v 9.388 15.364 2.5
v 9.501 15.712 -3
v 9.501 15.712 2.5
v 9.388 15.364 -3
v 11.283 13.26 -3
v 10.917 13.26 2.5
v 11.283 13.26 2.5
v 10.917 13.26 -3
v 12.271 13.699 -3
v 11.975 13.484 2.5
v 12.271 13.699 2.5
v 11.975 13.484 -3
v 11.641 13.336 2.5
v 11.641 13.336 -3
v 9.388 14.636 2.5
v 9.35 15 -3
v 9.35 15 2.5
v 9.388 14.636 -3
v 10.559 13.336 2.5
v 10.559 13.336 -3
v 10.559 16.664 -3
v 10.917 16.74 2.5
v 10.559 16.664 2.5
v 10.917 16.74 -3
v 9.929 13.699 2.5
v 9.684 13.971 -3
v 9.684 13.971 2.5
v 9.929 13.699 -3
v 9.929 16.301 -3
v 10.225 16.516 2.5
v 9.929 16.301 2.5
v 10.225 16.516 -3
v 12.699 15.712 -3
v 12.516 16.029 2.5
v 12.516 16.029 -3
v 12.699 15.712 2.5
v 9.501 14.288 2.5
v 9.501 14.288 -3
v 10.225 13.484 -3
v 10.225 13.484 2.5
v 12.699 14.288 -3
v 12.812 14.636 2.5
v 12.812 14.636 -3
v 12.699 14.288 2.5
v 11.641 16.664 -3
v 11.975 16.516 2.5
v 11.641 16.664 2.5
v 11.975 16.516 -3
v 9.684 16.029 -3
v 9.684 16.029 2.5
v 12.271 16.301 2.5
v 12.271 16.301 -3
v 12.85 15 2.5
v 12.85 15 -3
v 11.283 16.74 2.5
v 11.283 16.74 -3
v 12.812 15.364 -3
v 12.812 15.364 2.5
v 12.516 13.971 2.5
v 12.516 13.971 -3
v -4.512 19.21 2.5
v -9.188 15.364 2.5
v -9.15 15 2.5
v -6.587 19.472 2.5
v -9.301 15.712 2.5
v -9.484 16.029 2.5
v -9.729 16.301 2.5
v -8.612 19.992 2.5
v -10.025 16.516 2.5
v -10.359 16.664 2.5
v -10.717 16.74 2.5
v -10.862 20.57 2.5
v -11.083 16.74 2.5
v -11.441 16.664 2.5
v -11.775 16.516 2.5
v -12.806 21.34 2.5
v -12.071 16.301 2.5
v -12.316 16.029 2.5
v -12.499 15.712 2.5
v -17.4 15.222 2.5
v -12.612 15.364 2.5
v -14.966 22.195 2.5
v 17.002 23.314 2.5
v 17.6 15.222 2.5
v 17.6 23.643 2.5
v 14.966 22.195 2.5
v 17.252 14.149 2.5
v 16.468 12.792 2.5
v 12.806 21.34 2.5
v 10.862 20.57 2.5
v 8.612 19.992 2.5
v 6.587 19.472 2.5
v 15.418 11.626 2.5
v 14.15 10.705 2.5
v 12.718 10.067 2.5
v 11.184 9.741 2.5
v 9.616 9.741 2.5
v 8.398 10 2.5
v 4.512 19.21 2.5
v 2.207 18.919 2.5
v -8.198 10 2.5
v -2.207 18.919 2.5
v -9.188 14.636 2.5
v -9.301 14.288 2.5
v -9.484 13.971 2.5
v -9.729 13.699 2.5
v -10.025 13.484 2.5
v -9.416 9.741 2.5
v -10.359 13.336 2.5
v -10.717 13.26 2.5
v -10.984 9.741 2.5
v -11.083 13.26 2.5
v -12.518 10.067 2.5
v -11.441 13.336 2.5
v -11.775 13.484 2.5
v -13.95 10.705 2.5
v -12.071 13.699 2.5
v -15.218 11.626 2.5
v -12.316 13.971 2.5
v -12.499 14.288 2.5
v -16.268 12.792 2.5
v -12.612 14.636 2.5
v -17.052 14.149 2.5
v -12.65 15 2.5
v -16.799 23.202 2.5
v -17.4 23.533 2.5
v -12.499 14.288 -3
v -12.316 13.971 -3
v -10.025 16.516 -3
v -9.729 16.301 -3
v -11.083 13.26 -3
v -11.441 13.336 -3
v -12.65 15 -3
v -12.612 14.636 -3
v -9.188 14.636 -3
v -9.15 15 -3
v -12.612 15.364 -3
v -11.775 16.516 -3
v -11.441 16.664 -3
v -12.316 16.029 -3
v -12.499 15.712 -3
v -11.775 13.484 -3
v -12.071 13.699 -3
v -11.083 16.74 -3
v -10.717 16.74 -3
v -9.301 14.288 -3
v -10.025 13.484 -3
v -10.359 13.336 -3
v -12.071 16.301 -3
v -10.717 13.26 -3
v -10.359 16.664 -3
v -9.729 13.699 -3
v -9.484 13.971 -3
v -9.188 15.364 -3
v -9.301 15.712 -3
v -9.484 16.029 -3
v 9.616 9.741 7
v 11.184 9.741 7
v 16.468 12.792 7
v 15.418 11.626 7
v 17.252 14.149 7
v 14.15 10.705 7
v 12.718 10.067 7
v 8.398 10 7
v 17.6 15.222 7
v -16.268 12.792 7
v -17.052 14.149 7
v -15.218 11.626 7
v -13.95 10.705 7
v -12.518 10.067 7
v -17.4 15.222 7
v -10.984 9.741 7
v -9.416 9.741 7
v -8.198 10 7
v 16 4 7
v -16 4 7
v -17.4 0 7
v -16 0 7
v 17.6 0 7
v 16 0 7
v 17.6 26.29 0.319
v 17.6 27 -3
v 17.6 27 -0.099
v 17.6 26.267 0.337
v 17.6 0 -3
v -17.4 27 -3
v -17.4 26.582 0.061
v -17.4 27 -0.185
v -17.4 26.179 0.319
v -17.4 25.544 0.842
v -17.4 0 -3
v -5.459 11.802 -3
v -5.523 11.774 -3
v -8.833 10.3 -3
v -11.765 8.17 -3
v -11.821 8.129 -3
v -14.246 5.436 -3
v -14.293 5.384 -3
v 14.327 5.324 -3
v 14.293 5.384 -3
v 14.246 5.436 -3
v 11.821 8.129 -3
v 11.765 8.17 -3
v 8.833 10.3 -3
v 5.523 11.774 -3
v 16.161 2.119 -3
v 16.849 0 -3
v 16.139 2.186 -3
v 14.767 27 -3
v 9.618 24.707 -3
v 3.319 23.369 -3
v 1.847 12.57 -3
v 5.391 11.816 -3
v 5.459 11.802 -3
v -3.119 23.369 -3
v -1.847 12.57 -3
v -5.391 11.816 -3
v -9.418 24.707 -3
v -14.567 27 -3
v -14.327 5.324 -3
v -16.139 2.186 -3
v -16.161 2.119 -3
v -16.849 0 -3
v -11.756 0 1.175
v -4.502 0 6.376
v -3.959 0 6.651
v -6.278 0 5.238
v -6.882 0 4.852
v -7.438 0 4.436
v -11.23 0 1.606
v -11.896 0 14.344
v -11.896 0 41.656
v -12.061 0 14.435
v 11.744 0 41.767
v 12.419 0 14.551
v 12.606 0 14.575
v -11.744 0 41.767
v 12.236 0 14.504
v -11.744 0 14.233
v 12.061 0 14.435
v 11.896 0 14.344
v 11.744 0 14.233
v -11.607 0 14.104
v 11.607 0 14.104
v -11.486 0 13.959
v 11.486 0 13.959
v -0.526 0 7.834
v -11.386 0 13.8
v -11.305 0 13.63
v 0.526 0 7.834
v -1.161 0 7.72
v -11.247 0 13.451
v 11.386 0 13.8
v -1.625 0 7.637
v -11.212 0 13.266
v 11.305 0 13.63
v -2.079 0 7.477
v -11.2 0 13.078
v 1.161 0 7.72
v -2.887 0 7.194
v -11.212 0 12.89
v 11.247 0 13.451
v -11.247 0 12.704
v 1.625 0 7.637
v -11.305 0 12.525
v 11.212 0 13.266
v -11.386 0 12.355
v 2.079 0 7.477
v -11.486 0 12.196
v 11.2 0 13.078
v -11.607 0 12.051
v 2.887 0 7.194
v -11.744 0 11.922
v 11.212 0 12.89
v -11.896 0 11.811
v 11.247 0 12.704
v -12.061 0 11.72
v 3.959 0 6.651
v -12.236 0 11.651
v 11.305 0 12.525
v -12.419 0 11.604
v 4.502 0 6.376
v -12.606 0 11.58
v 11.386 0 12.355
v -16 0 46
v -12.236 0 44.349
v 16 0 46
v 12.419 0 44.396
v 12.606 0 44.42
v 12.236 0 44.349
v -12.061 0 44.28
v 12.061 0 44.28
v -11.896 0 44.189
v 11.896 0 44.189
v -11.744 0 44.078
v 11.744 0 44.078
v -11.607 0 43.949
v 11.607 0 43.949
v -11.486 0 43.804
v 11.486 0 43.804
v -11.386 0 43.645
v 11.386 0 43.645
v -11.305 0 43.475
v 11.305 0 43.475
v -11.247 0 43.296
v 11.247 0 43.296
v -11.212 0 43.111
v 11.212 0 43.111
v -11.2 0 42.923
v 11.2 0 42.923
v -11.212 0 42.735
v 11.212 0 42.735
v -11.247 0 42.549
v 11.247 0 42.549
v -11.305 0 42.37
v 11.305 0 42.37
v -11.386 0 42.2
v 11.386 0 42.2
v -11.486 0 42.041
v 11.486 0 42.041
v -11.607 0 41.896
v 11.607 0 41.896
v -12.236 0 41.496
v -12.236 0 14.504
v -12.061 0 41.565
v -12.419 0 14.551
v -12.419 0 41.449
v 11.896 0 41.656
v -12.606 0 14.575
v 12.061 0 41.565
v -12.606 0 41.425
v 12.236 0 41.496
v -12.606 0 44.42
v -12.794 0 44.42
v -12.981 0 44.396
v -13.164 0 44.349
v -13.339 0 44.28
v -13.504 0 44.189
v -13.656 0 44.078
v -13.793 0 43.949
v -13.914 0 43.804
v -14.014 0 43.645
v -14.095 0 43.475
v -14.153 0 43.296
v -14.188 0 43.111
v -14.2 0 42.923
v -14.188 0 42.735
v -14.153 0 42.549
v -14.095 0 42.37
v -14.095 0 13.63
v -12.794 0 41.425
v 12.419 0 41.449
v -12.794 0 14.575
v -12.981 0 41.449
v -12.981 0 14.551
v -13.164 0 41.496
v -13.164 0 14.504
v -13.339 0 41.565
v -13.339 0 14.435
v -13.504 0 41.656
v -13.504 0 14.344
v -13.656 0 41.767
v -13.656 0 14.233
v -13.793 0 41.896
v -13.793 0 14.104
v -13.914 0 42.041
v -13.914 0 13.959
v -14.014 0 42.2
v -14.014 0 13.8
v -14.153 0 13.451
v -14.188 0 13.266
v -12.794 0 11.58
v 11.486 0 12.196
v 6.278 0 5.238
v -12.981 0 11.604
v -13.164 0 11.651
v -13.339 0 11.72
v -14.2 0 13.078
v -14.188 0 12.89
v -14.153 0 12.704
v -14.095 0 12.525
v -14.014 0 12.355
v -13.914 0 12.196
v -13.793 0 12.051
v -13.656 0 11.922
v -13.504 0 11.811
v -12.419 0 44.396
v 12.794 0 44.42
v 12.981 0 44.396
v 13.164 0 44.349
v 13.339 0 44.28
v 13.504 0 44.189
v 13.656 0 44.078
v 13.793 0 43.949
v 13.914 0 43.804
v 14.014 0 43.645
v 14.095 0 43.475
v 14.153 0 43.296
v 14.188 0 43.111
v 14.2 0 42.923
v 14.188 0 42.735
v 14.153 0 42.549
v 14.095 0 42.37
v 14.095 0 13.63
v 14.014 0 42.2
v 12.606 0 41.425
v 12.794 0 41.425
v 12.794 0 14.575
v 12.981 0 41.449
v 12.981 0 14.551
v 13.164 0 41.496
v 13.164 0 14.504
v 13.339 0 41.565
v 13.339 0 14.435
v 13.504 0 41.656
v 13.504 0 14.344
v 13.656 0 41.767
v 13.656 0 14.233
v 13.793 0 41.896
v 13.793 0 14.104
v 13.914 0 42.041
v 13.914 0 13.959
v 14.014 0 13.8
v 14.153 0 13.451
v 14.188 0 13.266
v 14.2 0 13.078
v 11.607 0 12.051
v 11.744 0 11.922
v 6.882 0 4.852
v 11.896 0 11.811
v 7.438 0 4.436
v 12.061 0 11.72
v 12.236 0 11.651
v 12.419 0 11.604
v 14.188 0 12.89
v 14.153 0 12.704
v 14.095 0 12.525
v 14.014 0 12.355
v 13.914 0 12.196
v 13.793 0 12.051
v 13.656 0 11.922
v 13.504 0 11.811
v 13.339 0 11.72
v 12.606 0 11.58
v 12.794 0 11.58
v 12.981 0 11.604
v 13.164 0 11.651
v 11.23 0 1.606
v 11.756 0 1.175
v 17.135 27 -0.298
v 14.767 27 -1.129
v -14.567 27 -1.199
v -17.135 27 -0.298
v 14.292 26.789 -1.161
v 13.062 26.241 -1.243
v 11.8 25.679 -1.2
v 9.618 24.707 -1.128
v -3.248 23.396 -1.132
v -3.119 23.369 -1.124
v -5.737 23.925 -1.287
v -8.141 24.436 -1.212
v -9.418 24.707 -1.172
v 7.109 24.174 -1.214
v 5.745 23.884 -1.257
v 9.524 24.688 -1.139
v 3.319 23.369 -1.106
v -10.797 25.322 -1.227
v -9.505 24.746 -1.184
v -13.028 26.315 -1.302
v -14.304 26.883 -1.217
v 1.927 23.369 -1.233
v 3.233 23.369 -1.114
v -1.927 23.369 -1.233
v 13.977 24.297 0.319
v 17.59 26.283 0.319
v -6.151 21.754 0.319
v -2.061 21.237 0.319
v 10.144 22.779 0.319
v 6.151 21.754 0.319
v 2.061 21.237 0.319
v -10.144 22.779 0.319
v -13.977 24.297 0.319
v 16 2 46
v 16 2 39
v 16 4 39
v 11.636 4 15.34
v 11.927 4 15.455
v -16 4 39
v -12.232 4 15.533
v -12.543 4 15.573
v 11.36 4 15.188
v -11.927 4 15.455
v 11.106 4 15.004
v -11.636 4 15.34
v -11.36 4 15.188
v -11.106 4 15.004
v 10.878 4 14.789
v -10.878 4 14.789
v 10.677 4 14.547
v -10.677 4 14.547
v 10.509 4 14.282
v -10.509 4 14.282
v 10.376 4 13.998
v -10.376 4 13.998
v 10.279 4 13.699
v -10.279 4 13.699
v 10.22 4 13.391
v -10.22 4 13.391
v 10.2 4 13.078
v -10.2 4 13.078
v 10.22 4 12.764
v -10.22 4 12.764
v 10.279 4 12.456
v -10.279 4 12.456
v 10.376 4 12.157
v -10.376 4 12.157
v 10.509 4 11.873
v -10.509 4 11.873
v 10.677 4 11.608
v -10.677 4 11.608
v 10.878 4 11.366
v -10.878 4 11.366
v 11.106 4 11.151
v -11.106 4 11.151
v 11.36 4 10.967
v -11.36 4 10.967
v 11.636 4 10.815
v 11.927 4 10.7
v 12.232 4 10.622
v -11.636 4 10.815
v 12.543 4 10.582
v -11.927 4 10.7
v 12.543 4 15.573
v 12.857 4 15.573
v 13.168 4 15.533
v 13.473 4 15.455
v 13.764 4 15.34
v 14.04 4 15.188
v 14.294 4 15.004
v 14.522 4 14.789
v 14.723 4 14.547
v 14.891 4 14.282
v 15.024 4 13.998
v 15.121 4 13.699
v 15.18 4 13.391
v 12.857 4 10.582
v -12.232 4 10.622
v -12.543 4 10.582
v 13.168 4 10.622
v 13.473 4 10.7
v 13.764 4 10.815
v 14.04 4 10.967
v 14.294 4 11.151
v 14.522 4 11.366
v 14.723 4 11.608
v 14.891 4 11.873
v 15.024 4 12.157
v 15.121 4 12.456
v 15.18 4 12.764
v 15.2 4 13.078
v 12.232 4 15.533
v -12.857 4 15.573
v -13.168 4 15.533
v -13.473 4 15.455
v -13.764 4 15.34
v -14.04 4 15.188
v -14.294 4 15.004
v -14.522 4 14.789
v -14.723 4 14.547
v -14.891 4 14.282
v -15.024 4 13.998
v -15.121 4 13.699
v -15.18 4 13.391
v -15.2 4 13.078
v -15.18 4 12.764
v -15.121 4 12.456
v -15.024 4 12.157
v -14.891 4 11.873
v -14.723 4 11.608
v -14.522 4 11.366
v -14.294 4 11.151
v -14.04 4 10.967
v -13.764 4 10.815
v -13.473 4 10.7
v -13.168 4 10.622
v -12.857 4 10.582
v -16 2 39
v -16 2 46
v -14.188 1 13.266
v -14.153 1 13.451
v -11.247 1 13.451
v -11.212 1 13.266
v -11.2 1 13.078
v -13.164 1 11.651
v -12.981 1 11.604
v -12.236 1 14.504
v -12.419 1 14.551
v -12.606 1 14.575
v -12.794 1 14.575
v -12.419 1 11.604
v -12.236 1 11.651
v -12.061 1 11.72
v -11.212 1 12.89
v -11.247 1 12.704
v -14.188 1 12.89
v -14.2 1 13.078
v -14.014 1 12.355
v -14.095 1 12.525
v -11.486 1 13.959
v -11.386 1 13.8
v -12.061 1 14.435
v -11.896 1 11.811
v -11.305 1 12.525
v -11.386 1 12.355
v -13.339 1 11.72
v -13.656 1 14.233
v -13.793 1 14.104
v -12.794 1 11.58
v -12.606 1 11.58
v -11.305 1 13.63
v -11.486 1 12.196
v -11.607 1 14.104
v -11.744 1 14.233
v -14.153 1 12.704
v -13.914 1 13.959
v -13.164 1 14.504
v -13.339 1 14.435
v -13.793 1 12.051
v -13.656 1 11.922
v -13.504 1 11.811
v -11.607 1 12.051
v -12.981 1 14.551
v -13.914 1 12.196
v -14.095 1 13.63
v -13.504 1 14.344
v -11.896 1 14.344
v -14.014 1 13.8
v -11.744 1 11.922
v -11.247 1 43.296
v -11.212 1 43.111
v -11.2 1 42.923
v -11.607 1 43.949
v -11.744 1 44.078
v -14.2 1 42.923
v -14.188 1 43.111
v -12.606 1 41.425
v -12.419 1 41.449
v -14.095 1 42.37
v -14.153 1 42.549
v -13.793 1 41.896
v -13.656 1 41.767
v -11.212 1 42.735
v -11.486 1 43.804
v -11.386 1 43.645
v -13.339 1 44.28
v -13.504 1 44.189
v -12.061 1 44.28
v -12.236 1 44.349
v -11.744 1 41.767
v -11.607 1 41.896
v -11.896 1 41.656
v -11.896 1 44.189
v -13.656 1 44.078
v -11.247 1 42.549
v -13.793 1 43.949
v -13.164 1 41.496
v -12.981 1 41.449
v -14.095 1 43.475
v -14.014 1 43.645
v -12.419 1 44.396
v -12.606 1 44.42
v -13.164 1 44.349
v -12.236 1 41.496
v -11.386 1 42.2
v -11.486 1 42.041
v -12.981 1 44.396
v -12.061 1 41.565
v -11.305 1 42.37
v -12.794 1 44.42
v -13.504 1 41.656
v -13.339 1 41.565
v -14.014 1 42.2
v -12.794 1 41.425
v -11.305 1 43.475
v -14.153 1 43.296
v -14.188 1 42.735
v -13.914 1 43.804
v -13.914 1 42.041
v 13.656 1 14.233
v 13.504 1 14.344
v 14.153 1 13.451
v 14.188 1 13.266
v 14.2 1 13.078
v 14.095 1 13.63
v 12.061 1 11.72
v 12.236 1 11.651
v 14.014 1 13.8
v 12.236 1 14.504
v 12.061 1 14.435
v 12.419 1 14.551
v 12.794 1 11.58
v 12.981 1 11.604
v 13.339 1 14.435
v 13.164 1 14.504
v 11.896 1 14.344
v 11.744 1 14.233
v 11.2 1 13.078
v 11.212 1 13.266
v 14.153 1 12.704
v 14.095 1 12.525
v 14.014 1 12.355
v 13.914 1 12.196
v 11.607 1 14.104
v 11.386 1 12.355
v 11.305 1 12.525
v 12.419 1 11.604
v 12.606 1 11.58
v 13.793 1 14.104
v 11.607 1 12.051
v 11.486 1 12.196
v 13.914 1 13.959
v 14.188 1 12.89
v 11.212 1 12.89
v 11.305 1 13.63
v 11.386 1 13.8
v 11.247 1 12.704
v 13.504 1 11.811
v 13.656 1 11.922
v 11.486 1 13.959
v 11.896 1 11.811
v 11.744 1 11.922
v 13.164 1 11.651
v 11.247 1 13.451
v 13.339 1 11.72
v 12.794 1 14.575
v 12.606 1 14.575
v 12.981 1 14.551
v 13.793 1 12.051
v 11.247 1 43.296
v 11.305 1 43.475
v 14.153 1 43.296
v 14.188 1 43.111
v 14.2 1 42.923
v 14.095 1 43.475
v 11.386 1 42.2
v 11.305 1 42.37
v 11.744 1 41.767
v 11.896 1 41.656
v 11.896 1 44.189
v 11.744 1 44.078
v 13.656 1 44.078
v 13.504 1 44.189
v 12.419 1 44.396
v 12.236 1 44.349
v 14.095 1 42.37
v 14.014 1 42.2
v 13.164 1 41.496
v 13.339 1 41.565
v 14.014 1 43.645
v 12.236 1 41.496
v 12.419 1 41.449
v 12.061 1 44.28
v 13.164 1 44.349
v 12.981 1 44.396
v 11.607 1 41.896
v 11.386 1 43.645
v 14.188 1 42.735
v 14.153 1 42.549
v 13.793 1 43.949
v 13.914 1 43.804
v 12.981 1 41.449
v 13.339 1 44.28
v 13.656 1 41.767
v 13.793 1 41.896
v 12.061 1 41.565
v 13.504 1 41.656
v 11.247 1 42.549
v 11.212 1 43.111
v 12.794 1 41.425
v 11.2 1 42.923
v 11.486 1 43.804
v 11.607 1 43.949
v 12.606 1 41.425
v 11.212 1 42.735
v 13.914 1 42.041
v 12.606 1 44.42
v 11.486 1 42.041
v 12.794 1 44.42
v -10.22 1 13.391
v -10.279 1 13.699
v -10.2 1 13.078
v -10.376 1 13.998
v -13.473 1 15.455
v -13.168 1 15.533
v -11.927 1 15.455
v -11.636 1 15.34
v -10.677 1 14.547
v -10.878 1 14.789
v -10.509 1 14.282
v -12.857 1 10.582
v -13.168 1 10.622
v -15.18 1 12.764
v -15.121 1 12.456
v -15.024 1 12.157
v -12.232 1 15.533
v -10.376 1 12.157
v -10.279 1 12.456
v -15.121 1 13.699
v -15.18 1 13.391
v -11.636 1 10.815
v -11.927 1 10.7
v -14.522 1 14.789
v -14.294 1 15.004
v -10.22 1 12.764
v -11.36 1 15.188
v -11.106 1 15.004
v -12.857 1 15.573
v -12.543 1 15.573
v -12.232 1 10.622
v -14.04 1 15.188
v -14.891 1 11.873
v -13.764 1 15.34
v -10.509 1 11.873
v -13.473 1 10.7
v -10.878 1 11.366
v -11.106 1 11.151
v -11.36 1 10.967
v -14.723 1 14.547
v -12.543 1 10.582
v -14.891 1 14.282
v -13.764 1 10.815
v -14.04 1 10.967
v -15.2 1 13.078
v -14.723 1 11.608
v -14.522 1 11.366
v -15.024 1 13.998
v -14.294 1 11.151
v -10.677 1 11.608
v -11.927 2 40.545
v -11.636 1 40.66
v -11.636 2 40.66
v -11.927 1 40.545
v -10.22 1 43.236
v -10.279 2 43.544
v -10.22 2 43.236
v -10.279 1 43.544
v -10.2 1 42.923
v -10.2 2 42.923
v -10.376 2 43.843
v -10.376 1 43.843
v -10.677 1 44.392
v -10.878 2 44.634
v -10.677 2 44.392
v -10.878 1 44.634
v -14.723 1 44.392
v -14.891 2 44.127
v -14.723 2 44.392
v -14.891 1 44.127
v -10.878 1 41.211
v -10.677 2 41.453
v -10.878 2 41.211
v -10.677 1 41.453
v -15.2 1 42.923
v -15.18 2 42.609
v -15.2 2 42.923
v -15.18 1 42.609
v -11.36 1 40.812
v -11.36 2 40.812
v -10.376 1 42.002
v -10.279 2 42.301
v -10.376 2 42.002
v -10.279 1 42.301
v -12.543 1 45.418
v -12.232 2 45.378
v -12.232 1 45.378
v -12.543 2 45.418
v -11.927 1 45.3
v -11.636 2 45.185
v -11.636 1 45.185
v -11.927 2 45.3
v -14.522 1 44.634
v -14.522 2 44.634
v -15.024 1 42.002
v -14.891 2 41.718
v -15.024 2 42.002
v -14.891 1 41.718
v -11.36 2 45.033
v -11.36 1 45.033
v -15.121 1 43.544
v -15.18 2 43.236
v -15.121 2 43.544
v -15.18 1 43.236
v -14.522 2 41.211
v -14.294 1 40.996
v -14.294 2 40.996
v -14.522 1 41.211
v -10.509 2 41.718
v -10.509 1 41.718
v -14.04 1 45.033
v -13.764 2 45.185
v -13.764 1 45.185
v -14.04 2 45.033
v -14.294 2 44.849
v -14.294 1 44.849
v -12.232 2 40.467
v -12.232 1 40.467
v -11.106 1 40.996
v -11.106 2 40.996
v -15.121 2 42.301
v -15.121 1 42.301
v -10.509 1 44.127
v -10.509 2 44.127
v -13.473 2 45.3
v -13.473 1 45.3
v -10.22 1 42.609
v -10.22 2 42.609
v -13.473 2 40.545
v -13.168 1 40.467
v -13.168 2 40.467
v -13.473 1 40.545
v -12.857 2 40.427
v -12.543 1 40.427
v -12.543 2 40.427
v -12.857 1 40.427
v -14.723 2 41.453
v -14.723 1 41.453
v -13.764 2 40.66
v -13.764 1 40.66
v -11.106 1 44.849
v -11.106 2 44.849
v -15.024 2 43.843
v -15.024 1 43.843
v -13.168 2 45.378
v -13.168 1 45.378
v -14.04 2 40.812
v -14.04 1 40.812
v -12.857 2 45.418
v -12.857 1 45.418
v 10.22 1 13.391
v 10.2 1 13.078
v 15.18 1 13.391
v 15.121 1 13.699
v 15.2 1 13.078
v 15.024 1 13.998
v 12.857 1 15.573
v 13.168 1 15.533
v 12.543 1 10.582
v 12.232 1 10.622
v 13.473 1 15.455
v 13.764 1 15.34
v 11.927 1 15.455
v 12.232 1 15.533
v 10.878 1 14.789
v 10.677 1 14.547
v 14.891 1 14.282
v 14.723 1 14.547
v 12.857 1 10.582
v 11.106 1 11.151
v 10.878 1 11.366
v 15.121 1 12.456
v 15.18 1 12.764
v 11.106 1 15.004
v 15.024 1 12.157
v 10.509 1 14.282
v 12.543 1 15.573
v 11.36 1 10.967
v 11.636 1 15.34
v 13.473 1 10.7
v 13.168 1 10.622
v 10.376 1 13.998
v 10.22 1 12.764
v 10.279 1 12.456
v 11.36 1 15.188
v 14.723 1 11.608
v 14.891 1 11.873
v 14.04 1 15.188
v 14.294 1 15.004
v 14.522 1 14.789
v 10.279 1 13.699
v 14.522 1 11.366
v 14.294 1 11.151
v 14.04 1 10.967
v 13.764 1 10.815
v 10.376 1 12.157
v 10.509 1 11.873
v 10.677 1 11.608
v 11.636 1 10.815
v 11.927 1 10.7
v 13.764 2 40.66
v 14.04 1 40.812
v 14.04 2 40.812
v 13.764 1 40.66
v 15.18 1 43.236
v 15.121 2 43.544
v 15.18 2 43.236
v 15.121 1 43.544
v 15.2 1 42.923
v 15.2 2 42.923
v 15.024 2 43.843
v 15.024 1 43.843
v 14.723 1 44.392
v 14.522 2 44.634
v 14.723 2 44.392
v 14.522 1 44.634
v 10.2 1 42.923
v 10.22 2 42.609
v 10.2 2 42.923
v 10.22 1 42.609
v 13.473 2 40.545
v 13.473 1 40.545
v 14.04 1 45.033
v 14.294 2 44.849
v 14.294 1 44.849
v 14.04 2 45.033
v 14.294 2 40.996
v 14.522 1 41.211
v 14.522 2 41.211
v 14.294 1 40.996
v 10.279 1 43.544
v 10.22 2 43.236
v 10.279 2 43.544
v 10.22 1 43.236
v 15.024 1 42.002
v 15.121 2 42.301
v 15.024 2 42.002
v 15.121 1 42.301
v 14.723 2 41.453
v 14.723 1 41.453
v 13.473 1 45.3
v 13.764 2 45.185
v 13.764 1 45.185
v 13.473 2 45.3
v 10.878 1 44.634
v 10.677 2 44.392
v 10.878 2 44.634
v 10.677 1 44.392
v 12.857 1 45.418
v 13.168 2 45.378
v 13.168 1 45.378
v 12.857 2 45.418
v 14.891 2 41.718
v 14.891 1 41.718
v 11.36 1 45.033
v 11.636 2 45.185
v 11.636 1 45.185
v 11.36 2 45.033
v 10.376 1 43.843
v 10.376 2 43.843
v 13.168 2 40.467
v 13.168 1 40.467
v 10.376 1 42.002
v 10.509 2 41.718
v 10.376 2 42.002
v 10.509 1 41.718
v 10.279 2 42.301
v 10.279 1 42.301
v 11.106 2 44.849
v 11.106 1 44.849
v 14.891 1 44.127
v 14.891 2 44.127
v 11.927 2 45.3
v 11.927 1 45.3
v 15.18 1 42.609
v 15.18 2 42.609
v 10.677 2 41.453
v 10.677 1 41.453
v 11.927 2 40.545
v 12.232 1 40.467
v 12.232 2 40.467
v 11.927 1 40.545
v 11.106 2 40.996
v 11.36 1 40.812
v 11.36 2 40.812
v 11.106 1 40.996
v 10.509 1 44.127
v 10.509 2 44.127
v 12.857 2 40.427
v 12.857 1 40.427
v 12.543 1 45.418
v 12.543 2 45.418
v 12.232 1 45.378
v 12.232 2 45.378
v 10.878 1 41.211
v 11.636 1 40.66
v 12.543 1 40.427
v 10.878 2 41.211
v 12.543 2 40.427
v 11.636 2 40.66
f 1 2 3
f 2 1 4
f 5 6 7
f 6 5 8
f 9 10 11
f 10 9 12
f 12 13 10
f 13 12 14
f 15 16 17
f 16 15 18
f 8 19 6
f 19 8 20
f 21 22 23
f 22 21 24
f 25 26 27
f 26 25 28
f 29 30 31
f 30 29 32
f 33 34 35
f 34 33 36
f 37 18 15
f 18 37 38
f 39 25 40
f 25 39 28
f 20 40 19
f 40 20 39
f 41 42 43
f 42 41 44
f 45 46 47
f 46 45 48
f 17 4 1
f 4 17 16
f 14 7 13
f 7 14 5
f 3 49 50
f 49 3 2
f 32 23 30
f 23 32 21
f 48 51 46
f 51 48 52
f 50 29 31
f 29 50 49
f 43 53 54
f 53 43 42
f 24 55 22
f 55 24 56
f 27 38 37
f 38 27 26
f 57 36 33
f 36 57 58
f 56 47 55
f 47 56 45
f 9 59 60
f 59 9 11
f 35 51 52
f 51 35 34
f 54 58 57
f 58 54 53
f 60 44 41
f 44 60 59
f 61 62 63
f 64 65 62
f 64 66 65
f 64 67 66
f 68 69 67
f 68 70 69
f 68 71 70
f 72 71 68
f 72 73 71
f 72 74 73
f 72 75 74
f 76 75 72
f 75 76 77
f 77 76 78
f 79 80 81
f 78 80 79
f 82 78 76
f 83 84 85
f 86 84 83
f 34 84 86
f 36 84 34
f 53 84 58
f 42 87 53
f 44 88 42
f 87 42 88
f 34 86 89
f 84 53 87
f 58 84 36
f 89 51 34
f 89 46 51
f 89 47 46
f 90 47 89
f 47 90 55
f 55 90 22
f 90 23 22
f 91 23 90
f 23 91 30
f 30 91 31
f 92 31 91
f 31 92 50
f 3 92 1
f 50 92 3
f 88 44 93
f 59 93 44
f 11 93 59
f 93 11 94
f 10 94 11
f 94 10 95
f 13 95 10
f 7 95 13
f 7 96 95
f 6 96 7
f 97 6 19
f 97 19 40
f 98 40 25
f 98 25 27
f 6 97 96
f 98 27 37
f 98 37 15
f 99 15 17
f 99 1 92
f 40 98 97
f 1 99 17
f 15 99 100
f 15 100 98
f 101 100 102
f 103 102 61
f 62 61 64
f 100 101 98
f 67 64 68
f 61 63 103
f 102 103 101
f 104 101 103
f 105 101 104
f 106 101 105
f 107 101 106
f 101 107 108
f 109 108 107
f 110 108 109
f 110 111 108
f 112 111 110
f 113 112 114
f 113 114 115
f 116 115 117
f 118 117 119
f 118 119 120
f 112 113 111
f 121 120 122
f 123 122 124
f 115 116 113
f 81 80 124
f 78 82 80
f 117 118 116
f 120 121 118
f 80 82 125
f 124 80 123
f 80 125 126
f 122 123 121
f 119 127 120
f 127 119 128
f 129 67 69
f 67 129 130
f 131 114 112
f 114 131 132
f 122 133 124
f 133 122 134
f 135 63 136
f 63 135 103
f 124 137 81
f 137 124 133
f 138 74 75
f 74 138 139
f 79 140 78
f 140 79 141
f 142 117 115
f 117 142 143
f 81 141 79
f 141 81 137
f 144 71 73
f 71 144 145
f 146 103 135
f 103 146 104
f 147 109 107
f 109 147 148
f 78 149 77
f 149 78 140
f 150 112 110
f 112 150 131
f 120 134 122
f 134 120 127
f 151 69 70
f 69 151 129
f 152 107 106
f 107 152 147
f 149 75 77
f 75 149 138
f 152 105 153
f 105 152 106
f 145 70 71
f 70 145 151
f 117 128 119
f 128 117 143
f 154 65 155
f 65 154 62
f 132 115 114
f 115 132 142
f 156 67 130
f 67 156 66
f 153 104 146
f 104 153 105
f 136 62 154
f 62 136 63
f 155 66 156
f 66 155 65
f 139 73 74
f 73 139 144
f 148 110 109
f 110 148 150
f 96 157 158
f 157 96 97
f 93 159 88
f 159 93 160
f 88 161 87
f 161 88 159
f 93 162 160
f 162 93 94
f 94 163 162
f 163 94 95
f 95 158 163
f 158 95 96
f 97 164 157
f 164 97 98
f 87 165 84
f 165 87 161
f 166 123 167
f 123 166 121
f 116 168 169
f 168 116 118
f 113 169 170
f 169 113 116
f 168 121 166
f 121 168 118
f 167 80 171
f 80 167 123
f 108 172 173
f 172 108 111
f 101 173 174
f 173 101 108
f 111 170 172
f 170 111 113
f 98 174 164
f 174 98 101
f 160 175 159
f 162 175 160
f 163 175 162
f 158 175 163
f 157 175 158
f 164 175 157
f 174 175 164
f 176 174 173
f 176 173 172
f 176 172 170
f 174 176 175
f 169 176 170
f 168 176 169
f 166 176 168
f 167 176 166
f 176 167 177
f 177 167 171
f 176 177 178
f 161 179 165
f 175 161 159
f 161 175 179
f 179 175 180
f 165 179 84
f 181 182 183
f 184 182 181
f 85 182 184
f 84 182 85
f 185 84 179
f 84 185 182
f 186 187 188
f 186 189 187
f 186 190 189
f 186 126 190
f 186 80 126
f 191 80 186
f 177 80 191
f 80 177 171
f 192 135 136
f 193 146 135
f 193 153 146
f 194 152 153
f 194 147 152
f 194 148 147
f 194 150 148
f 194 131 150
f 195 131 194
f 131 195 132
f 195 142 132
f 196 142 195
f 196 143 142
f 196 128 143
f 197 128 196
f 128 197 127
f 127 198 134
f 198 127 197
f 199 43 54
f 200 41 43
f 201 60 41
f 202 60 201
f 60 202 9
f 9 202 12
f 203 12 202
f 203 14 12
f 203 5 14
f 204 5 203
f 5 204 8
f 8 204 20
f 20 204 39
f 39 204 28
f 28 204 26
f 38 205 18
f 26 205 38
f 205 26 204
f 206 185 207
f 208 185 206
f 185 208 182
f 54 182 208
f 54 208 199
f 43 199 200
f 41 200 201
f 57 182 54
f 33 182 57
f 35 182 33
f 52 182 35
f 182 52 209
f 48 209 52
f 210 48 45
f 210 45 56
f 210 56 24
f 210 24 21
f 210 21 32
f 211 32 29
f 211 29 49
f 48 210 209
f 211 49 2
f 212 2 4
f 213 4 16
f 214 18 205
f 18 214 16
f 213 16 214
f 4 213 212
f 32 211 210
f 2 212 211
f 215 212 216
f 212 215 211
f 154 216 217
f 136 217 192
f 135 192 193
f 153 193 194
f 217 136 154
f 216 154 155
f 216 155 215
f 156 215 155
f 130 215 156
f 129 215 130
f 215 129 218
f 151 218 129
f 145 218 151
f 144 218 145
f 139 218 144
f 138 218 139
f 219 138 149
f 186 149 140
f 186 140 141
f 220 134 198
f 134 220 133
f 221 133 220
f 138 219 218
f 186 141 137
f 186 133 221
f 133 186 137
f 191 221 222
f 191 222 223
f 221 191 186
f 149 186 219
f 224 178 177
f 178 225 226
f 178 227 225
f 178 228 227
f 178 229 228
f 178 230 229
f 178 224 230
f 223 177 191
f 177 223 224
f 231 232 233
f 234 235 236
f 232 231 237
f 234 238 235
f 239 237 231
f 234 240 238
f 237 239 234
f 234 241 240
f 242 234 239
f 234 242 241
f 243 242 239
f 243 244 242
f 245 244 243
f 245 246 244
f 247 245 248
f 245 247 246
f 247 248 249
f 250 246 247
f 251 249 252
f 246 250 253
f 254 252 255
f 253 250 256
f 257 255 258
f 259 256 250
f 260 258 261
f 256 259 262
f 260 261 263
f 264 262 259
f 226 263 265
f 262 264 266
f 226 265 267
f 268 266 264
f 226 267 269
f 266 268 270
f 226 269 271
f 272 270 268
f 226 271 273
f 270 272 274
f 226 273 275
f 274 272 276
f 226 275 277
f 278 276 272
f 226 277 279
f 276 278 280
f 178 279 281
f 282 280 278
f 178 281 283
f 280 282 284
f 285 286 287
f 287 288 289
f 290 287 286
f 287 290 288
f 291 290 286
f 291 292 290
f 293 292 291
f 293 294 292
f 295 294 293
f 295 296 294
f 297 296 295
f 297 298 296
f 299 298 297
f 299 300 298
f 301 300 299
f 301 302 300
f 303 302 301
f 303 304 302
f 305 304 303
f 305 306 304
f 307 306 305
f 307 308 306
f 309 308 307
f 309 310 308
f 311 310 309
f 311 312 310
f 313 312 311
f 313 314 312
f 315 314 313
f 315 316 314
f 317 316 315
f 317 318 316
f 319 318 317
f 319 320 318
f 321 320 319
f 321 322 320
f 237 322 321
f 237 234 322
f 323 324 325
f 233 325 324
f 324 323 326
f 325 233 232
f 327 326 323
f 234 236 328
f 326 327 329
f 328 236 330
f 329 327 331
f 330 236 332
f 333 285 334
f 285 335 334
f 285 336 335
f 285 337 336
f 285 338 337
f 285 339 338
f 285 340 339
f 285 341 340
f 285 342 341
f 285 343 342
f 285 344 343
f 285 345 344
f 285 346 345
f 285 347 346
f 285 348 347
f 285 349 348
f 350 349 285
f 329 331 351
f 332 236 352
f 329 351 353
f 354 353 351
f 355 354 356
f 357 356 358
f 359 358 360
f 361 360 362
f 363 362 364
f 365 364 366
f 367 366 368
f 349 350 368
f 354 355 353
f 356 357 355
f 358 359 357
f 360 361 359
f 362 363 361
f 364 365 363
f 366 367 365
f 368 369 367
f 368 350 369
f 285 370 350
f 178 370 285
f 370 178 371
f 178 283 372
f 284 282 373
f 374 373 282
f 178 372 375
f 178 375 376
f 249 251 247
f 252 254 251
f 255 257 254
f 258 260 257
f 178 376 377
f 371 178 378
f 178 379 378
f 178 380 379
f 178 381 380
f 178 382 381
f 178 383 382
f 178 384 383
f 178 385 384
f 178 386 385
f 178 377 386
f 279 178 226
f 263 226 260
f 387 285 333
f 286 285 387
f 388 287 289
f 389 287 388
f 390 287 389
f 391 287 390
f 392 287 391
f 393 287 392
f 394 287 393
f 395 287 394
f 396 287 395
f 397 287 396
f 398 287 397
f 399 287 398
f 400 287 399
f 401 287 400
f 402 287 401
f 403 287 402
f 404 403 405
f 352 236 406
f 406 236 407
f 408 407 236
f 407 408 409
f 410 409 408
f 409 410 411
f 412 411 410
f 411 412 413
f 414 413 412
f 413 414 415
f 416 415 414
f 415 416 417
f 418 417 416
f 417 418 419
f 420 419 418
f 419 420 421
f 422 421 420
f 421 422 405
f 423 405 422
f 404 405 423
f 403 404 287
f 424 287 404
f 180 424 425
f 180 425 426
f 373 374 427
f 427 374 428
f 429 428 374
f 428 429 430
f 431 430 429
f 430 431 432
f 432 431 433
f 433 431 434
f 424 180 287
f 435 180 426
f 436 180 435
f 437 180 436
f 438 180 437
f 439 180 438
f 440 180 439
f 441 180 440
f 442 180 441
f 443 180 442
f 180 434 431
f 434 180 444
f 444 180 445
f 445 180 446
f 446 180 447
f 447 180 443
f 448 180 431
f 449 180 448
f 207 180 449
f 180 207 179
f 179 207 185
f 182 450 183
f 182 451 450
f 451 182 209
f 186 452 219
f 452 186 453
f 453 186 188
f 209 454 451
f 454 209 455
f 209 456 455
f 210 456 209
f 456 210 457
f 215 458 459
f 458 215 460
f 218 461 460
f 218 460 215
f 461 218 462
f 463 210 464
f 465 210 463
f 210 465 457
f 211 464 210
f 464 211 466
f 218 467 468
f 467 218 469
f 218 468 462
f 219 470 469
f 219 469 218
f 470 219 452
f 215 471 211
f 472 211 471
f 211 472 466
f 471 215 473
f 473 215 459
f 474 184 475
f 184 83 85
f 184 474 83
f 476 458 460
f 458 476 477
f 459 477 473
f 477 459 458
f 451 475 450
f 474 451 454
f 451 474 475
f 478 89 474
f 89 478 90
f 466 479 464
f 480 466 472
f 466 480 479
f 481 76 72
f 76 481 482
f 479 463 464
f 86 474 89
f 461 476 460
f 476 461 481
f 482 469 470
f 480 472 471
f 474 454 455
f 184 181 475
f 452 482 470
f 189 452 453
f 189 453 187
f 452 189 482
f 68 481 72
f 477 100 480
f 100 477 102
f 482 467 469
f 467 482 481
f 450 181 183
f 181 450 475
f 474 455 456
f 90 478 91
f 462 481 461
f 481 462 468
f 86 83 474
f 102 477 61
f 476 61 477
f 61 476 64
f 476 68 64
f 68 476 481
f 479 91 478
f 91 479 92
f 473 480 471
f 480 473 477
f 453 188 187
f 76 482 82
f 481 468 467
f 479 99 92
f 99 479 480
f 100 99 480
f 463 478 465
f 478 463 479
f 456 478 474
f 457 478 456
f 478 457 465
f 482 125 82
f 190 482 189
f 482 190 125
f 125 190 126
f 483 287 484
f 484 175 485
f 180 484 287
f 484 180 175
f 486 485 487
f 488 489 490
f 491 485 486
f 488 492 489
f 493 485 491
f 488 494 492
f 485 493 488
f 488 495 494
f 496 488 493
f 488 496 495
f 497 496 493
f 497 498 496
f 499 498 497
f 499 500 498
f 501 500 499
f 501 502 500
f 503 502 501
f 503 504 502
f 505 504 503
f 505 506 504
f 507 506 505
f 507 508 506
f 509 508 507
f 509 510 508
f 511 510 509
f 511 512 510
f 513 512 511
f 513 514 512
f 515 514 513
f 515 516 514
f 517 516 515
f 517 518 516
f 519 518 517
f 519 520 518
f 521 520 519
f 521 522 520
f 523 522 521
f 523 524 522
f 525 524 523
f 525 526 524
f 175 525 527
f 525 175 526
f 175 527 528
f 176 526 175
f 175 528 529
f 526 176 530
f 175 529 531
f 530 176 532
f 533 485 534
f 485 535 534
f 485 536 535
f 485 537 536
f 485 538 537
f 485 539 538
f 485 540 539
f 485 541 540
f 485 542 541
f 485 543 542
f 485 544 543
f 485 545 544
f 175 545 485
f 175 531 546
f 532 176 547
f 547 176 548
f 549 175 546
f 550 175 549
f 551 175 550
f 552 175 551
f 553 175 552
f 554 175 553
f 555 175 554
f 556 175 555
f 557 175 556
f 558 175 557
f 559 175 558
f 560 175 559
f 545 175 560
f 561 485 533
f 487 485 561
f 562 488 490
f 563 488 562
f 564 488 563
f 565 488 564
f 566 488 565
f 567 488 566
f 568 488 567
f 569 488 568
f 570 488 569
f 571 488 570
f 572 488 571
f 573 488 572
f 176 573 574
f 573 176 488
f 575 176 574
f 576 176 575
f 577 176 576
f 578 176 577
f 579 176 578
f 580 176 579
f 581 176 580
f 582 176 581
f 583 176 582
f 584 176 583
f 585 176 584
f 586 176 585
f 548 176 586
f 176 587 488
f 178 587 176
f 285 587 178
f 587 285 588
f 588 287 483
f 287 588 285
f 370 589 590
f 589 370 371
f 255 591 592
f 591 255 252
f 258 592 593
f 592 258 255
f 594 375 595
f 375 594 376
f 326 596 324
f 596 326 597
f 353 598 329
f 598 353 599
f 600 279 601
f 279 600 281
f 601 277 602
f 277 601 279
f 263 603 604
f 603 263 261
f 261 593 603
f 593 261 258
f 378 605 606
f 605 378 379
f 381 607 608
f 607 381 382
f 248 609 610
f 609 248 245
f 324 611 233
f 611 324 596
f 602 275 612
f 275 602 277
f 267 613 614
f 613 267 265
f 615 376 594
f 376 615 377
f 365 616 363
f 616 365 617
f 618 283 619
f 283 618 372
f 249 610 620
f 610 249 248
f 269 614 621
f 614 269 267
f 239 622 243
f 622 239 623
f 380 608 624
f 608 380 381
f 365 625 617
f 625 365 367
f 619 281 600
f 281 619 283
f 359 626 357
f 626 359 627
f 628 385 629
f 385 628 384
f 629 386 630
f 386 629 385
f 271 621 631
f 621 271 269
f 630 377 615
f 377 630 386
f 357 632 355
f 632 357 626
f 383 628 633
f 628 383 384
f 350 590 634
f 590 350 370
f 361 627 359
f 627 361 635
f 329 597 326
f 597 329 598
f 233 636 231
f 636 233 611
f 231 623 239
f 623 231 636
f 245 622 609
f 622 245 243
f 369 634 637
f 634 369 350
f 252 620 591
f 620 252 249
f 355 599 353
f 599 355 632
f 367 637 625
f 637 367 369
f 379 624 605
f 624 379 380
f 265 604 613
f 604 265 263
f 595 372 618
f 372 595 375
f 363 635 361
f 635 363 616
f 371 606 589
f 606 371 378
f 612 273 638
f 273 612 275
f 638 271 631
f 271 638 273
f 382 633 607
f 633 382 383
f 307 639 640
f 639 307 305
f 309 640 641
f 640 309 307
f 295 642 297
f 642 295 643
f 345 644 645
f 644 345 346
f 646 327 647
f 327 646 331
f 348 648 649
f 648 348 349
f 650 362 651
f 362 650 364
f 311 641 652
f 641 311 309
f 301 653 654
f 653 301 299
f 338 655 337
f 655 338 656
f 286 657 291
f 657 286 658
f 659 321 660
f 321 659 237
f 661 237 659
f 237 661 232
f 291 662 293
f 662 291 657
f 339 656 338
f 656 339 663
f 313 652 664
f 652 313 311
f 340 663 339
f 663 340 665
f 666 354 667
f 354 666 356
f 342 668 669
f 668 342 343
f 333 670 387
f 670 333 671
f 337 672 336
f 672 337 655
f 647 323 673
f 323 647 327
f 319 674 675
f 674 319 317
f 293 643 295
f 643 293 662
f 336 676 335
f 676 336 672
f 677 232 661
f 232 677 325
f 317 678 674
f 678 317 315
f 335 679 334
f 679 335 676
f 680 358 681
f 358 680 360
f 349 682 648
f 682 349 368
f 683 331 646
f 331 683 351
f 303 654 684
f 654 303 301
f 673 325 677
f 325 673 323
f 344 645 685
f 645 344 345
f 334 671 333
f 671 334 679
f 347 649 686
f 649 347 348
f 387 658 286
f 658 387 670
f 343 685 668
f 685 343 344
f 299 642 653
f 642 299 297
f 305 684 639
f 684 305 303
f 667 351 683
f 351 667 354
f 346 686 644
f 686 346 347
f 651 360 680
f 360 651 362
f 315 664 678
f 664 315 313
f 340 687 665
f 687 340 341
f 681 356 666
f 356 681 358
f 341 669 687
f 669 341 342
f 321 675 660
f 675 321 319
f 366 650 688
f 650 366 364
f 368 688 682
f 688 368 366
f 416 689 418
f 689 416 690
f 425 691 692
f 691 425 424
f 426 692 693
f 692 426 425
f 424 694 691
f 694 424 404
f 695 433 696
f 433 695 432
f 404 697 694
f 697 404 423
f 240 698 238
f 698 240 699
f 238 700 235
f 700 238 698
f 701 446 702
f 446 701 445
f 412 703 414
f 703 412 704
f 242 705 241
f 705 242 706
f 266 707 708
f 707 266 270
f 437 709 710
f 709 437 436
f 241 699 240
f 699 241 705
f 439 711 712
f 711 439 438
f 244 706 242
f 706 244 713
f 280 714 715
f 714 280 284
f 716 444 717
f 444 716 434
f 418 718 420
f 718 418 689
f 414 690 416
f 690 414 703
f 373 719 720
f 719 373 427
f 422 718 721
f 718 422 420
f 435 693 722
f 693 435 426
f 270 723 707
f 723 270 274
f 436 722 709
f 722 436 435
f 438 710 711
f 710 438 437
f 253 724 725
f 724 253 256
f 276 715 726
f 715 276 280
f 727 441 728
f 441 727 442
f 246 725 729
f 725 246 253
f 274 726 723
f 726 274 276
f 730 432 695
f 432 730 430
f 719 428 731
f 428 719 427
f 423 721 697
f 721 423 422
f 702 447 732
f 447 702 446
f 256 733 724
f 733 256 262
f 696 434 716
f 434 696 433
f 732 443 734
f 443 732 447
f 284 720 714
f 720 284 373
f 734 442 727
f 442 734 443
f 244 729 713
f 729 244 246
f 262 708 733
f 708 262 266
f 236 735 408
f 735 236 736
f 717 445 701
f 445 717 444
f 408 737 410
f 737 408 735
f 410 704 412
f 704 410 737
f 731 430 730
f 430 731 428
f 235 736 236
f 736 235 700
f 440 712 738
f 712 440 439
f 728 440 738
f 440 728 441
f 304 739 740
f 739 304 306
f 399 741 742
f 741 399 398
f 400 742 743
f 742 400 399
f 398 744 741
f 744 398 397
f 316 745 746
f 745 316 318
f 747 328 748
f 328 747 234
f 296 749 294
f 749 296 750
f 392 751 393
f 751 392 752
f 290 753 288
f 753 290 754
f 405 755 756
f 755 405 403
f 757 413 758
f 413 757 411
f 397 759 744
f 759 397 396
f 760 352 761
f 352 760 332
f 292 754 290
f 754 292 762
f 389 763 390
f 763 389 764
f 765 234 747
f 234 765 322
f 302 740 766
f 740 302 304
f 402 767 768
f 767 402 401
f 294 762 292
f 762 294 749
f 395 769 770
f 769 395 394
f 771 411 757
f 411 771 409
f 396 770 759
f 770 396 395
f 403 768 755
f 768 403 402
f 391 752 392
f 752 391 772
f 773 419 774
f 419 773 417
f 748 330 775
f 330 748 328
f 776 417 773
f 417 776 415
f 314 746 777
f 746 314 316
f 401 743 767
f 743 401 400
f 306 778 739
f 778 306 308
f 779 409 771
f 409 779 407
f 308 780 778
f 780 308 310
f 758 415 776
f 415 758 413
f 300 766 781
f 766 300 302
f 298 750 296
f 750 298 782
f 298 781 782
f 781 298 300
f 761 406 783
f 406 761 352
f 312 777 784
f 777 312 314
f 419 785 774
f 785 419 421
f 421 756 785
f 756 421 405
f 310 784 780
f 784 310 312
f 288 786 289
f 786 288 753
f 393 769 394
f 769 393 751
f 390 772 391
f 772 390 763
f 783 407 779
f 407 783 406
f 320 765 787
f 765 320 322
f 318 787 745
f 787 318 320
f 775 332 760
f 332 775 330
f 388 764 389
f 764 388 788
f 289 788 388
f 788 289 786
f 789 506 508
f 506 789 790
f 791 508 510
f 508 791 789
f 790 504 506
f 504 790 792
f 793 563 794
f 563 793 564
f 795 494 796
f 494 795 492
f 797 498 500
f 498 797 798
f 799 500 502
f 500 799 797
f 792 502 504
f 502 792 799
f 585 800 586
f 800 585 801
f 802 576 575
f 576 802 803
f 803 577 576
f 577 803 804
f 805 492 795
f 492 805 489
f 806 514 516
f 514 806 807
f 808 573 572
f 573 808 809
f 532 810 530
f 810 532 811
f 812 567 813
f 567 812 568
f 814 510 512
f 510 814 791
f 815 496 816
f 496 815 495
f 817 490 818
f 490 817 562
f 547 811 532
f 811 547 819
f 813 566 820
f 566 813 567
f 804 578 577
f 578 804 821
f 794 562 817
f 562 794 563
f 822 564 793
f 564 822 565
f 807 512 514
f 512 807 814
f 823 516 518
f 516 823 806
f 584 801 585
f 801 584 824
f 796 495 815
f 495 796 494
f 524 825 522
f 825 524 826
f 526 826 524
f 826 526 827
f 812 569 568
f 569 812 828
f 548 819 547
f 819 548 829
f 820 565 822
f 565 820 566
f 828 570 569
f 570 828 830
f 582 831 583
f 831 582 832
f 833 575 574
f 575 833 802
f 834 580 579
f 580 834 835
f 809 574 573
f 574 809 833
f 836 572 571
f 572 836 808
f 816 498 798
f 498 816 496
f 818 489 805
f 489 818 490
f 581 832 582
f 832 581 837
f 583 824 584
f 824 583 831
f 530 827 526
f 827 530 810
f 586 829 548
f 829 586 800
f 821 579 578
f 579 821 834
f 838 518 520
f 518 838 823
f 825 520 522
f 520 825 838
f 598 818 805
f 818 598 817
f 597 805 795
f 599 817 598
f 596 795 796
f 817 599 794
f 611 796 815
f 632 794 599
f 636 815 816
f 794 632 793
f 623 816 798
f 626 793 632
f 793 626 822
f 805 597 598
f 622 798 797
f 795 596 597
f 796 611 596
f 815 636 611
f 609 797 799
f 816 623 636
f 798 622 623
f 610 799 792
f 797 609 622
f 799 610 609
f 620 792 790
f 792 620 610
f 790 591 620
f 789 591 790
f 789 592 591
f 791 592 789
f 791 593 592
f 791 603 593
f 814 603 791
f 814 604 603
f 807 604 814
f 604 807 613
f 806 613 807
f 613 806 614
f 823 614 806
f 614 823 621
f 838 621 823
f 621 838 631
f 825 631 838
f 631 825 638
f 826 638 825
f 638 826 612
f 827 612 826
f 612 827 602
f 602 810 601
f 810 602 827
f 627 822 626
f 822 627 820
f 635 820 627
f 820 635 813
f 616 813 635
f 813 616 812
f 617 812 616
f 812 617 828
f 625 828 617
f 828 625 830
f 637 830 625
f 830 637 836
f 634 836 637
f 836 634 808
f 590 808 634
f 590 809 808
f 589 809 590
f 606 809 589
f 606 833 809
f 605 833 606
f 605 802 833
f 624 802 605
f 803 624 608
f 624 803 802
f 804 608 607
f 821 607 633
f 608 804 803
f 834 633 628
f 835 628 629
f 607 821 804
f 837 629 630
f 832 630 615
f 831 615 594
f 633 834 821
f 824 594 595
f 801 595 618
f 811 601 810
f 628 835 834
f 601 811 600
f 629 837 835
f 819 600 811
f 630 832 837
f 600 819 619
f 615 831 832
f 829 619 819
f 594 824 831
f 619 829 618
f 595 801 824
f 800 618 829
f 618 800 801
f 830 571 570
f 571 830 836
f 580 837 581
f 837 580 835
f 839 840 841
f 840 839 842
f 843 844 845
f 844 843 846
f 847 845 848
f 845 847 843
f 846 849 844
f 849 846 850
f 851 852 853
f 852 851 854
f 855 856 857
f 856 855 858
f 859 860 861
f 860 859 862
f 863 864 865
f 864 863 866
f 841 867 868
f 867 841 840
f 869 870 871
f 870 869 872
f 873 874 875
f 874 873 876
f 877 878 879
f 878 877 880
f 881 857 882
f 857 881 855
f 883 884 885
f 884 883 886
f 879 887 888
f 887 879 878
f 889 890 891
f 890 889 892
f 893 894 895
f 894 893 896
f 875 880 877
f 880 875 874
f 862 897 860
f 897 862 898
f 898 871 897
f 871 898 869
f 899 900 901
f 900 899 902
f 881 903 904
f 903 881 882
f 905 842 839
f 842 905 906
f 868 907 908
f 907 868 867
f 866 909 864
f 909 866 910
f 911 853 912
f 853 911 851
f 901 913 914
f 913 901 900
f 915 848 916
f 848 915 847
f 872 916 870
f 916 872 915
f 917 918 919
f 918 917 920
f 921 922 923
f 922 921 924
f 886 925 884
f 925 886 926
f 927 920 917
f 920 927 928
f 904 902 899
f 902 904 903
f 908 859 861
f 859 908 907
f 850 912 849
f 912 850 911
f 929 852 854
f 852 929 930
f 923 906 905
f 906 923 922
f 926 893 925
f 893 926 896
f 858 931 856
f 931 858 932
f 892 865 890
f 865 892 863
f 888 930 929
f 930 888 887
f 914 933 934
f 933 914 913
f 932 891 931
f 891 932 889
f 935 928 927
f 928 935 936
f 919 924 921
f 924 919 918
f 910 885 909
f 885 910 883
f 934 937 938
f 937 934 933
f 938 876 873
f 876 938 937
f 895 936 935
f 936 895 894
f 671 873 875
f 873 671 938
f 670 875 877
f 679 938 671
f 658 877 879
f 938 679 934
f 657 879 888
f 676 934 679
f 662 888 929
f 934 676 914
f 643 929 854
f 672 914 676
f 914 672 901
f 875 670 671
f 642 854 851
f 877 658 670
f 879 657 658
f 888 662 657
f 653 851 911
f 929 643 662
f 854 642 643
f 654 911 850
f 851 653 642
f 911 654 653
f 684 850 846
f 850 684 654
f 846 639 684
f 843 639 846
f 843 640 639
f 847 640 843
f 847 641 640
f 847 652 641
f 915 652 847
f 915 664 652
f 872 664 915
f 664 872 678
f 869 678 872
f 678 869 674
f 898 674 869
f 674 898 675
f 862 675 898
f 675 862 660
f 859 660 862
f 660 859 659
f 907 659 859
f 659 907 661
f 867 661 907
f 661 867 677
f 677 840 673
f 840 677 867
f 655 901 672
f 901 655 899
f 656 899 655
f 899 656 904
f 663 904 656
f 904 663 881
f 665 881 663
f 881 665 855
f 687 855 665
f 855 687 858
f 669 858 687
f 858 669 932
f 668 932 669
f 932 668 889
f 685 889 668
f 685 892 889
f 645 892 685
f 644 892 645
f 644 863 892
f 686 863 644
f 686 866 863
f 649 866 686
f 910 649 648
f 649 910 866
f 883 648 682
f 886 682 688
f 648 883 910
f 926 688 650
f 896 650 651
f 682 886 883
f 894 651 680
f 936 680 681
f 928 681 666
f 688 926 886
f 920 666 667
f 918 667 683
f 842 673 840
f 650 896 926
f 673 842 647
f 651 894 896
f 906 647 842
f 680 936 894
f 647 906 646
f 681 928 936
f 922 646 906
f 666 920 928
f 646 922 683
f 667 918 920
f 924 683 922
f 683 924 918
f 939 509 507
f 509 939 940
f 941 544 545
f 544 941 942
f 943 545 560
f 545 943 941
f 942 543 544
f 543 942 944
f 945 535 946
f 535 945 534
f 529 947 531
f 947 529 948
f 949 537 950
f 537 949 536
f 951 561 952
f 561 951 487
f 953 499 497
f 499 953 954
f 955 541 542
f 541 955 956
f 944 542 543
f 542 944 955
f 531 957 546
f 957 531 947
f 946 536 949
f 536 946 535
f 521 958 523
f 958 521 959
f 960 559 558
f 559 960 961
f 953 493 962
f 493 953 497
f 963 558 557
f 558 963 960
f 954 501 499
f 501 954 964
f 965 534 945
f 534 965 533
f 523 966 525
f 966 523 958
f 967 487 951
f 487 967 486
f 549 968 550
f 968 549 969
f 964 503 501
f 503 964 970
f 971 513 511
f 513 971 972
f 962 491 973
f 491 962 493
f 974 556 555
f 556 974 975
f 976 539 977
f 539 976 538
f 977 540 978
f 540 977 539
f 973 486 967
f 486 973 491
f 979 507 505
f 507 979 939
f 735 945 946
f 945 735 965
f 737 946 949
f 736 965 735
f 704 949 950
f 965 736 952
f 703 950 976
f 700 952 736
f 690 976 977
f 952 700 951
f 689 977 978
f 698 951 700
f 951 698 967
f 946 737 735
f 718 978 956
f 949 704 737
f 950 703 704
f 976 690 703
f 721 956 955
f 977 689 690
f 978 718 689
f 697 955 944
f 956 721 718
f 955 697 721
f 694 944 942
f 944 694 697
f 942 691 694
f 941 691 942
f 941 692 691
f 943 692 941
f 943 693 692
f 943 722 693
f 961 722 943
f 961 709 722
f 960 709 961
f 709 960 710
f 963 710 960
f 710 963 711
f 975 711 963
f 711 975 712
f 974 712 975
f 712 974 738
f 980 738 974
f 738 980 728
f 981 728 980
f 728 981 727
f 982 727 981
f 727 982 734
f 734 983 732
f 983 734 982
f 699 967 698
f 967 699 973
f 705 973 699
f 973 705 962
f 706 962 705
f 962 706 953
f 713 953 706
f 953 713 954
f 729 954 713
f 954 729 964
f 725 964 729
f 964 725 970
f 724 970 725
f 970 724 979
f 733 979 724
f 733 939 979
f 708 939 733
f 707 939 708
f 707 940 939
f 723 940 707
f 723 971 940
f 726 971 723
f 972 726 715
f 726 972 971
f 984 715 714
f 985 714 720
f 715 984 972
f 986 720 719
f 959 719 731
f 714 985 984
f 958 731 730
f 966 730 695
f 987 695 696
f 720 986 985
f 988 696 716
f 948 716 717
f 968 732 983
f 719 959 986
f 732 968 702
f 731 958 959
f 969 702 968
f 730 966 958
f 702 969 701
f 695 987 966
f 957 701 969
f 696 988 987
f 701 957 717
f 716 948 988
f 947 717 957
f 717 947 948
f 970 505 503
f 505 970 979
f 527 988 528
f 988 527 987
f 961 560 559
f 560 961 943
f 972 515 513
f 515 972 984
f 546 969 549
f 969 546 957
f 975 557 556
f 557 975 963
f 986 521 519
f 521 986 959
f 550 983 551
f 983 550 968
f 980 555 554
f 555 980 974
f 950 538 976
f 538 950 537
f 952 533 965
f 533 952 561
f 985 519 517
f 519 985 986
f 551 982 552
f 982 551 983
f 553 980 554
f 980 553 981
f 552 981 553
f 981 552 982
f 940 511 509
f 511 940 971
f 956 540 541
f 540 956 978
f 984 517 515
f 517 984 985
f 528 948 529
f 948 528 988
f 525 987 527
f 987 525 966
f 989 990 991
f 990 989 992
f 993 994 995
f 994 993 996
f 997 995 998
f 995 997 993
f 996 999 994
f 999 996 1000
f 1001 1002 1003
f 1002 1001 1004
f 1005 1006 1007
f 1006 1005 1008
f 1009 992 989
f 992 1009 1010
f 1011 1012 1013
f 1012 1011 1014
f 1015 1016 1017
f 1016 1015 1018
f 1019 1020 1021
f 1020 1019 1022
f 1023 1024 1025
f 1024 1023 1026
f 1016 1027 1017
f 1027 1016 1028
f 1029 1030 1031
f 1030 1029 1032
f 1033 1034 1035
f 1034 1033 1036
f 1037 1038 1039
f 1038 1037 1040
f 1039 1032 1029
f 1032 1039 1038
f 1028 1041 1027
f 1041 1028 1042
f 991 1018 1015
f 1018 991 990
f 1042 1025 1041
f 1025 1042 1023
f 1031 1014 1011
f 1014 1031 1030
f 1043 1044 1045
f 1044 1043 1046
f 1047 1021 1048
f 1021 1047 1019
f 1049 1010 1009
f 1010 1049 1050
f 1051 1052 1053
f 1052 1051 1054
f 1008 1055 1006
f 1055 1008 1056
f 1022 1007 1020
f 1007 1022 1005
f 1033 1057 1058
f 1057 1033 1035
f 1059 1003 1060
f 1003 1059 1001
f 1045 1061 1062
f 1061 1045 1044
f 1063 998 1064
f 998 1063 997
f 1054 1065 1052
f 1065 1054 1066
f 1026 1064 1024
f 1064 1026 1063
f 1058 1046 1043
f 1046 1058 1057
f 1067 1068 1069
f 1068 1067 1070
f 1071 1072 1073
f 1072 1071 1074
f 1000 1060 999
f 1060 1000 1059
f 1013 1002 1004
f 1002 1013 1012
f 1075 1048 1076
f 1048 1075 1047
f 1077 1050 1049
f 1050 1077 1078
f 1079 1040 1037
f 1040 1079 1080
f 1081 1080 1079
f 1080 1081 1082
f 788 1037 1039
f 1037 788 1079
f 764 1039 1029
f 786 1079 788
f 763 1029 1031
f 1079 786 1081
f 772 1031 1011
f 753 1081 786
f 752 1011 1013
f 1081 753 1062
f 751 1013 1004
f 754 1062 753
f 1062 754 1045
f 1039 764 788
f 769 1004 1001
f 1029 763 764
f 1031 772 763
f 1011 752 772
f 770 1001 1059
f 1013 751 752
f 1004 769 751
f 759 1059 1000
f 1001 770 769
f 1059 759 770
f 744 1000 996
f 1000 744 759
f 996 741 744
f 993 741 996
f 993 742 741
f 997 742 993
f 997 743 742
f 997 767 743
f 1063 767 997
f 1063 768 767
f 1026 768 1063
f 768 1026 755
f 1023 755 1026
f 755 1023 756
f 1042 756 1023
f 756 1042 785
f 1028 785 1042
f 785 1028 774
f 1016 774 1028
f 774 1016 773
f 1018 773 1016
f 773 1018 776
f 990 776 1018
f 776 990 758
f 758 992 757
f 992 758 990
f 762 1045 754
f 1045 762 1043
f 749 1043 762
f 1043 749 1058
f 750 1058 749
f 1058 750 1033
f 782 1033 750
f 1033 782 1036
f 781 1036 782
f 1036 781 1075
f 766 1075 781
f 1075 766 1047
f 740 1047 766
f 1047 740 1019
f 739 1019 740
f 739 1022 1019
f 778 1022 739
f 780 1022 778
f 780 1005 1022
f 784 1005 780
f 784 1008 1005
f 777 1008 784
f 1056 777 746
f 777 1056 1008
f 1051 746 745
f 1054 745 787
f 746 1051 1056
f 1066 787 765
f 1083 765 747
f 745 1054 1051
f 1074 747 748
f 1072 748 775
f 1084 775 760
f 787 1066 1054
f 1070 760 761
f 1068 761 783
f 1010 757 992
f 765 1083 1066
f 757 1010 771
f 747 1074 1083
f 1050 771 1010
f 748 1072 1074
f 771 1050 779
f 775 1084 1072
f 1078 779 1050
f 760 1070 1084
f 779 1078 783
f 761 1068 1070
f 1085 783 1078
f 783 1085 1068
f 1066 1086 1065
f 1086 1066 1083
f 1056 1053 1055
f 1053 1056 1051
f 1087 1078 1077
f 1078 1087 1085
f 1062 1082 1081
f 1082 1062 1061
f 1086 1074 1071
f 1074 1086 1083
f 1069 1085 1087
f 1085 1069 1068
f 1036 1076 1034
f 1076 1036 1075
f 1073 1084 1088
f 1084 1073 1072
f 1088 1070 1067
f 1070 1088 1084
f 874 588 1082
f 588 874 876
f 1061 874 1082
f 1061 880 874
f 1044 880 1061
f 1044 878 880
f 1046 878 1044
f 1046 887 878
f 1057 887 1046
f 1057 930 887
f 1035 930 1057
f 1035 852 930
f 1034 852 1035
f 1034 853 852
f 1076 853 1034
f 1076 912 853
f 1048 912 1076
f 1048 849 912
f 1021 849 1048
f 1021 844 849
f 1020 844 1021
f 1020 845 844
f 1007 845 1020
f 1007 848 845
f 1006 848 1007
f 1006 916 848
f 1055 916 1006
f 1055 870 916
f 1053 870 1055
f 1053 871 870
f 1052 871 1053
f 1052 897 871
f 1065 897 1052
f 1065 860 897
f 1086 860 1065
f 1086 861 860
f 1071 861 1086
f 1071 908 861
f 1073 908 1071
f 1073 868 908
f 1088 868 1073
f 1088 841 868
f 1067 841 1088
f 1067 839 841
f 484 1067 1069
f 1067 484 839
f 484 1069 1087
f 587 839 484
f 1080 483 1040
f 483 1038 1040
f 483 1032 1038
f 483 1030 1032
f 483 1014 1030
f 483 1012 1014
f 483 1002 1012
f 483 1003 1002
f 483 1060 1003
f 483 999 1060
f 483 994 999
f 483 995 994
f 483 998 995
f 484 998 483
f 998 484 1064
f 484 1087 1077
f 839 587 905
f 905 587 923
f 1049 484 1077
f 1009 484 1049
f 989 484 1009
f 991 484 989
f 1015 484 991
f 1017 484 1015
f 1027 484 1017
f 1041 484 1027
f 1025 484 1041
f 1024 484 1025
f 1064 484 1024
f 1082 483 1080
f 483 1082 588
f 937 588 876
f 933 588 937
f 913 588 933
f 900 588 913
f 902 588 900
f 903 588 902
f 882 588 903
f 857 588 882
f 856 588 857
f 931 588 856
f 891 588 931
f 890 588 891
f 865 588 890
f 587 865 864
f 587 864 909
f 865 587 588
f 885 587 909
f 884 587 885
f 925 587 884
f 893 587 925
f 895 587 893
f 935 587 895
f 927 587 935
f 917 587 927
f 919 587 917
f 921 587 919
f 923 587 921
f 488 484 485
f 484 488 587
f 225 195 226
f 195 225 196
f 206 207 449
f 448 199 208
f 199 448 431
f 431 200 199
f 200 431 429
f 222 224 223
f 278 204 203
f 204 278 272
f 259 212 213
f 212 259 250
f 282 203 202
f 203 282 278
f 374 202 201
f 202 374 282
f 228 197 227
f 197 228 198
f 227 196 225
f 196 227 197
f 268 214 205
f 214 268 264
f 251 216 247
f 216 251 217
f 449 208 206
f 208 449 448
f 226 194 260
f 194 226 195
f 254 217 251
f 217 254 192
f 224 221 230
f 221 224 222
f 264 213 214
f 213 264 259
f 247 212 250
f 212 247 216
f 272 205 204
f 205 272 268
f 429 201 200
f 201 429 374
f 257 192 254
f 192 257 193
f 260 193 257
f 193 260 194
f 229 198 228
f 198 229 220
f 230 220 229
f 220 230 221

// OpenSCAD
inch = 25.4;
W = 32;
H = 36;
w = 1 * inch;
h = 1.175 * inch;

T = 4;

extend = 0;
module base(){
  translate([-51, 97, 16])
    rotate([0, -90, 180])
    union(){
    difference()
      {
	translate([-19, 50-extend, -35/2])cube([10, 27.+extend, 35]);
	translate([0, -extend, 0])
	union(){
	  translate([-49, 62, 11])rotate([0, 90, 0])cylinder(d=3.5, h=50, $fn=30);
	  translate([-13.5, 62, 11])rotate([0, 90, 0])cylinder(d=8, h=50, $fn=30);
	  translate([-49, 62, -11])rotate([0, 90, 0])cylinder(d=3.5, h=50, $fn=30);
	  translate([-13.5, 62, -11])rotate([0, 90, 0])cylinder(d=8, h=50, $fn=30);
	  translate([-13.5, 59.8, 10.3])rotate([0, 90, 0])cylinder(d=15, h=50, $fn=30);
	  translate([-13.5, 59.8, -10.3])rotate([0, 90, 0])cylinder(d=15, h=50, $fn=30);
	  translate([-13.5, 17, -12.])cube([40, 50, 24]);
	  translate([-13.5, 40, -20.])cube([20, 20, 40]);
	}
      }
  }
}
module unit(){
  offset = 7;
  translate([0, 0, 0])rotate([0, 0, 0])difference(){
    translate([0, 0, 0])base();
    translate([0, 0+extend, 0])
      union(){
      translate([-51,   67 + offset, -20])cylinder(r=23.8 + offset, h=50, $fn=30);
      translate([-51.1, 67 + offset, 40])sphere(r=51.5, $fn=50);
    }
  }

}
difference(){
  union(){
    translate([51.1, -20, 0])rotate([0, 0, 0])unit();
    //translate([-35/2, 0, 0])cube([35, 5, 45]);
    
    translate([0, T, 10])rotate(a=90, v=[1, 0, 0])translate([0, H/2, 0])difference(){
      translate([-W/2, -H/2 - T, 0])cube([W, H + T, T]);
      translate([-w/2, -h/2, ,-1])cylinder(h=10, r=1.5, $fn=50);
      translate([-w/2,  h/2, ,-1])cylinder(h=10, r=1.5, $fn=50);
      translate([ w/2, -h/2, ,-1])cylinder(h=10, r=1.5, $fn=50);
      translate([ w/2,  h/2, ,-1])cylinder(h=10, r=1.5, $fn=50);
      translate([-w/2, -h/2, ,-7])cylinder(h=10, r=2.5, $fn=50);
      translate([-w/2,  h/2, ,-7])cylinder(h=10, r=2.5, $fn=50);
      translate([ w/2, -h/2, ,-7])cylinder(h=10, r=2.5, $fn=50);
      translate([ w/2,  h/2, ,-7])cylinder(h=10, r=2.5, $fn=50);
      translate([-50, -H/2 + 30 - 1, -18])cube([100, 50, 20]);
    }
  }
translate([0, -5, -5])rotate([0, 0, 0])cylinder(d1=40, d2=5, h=15);
}
